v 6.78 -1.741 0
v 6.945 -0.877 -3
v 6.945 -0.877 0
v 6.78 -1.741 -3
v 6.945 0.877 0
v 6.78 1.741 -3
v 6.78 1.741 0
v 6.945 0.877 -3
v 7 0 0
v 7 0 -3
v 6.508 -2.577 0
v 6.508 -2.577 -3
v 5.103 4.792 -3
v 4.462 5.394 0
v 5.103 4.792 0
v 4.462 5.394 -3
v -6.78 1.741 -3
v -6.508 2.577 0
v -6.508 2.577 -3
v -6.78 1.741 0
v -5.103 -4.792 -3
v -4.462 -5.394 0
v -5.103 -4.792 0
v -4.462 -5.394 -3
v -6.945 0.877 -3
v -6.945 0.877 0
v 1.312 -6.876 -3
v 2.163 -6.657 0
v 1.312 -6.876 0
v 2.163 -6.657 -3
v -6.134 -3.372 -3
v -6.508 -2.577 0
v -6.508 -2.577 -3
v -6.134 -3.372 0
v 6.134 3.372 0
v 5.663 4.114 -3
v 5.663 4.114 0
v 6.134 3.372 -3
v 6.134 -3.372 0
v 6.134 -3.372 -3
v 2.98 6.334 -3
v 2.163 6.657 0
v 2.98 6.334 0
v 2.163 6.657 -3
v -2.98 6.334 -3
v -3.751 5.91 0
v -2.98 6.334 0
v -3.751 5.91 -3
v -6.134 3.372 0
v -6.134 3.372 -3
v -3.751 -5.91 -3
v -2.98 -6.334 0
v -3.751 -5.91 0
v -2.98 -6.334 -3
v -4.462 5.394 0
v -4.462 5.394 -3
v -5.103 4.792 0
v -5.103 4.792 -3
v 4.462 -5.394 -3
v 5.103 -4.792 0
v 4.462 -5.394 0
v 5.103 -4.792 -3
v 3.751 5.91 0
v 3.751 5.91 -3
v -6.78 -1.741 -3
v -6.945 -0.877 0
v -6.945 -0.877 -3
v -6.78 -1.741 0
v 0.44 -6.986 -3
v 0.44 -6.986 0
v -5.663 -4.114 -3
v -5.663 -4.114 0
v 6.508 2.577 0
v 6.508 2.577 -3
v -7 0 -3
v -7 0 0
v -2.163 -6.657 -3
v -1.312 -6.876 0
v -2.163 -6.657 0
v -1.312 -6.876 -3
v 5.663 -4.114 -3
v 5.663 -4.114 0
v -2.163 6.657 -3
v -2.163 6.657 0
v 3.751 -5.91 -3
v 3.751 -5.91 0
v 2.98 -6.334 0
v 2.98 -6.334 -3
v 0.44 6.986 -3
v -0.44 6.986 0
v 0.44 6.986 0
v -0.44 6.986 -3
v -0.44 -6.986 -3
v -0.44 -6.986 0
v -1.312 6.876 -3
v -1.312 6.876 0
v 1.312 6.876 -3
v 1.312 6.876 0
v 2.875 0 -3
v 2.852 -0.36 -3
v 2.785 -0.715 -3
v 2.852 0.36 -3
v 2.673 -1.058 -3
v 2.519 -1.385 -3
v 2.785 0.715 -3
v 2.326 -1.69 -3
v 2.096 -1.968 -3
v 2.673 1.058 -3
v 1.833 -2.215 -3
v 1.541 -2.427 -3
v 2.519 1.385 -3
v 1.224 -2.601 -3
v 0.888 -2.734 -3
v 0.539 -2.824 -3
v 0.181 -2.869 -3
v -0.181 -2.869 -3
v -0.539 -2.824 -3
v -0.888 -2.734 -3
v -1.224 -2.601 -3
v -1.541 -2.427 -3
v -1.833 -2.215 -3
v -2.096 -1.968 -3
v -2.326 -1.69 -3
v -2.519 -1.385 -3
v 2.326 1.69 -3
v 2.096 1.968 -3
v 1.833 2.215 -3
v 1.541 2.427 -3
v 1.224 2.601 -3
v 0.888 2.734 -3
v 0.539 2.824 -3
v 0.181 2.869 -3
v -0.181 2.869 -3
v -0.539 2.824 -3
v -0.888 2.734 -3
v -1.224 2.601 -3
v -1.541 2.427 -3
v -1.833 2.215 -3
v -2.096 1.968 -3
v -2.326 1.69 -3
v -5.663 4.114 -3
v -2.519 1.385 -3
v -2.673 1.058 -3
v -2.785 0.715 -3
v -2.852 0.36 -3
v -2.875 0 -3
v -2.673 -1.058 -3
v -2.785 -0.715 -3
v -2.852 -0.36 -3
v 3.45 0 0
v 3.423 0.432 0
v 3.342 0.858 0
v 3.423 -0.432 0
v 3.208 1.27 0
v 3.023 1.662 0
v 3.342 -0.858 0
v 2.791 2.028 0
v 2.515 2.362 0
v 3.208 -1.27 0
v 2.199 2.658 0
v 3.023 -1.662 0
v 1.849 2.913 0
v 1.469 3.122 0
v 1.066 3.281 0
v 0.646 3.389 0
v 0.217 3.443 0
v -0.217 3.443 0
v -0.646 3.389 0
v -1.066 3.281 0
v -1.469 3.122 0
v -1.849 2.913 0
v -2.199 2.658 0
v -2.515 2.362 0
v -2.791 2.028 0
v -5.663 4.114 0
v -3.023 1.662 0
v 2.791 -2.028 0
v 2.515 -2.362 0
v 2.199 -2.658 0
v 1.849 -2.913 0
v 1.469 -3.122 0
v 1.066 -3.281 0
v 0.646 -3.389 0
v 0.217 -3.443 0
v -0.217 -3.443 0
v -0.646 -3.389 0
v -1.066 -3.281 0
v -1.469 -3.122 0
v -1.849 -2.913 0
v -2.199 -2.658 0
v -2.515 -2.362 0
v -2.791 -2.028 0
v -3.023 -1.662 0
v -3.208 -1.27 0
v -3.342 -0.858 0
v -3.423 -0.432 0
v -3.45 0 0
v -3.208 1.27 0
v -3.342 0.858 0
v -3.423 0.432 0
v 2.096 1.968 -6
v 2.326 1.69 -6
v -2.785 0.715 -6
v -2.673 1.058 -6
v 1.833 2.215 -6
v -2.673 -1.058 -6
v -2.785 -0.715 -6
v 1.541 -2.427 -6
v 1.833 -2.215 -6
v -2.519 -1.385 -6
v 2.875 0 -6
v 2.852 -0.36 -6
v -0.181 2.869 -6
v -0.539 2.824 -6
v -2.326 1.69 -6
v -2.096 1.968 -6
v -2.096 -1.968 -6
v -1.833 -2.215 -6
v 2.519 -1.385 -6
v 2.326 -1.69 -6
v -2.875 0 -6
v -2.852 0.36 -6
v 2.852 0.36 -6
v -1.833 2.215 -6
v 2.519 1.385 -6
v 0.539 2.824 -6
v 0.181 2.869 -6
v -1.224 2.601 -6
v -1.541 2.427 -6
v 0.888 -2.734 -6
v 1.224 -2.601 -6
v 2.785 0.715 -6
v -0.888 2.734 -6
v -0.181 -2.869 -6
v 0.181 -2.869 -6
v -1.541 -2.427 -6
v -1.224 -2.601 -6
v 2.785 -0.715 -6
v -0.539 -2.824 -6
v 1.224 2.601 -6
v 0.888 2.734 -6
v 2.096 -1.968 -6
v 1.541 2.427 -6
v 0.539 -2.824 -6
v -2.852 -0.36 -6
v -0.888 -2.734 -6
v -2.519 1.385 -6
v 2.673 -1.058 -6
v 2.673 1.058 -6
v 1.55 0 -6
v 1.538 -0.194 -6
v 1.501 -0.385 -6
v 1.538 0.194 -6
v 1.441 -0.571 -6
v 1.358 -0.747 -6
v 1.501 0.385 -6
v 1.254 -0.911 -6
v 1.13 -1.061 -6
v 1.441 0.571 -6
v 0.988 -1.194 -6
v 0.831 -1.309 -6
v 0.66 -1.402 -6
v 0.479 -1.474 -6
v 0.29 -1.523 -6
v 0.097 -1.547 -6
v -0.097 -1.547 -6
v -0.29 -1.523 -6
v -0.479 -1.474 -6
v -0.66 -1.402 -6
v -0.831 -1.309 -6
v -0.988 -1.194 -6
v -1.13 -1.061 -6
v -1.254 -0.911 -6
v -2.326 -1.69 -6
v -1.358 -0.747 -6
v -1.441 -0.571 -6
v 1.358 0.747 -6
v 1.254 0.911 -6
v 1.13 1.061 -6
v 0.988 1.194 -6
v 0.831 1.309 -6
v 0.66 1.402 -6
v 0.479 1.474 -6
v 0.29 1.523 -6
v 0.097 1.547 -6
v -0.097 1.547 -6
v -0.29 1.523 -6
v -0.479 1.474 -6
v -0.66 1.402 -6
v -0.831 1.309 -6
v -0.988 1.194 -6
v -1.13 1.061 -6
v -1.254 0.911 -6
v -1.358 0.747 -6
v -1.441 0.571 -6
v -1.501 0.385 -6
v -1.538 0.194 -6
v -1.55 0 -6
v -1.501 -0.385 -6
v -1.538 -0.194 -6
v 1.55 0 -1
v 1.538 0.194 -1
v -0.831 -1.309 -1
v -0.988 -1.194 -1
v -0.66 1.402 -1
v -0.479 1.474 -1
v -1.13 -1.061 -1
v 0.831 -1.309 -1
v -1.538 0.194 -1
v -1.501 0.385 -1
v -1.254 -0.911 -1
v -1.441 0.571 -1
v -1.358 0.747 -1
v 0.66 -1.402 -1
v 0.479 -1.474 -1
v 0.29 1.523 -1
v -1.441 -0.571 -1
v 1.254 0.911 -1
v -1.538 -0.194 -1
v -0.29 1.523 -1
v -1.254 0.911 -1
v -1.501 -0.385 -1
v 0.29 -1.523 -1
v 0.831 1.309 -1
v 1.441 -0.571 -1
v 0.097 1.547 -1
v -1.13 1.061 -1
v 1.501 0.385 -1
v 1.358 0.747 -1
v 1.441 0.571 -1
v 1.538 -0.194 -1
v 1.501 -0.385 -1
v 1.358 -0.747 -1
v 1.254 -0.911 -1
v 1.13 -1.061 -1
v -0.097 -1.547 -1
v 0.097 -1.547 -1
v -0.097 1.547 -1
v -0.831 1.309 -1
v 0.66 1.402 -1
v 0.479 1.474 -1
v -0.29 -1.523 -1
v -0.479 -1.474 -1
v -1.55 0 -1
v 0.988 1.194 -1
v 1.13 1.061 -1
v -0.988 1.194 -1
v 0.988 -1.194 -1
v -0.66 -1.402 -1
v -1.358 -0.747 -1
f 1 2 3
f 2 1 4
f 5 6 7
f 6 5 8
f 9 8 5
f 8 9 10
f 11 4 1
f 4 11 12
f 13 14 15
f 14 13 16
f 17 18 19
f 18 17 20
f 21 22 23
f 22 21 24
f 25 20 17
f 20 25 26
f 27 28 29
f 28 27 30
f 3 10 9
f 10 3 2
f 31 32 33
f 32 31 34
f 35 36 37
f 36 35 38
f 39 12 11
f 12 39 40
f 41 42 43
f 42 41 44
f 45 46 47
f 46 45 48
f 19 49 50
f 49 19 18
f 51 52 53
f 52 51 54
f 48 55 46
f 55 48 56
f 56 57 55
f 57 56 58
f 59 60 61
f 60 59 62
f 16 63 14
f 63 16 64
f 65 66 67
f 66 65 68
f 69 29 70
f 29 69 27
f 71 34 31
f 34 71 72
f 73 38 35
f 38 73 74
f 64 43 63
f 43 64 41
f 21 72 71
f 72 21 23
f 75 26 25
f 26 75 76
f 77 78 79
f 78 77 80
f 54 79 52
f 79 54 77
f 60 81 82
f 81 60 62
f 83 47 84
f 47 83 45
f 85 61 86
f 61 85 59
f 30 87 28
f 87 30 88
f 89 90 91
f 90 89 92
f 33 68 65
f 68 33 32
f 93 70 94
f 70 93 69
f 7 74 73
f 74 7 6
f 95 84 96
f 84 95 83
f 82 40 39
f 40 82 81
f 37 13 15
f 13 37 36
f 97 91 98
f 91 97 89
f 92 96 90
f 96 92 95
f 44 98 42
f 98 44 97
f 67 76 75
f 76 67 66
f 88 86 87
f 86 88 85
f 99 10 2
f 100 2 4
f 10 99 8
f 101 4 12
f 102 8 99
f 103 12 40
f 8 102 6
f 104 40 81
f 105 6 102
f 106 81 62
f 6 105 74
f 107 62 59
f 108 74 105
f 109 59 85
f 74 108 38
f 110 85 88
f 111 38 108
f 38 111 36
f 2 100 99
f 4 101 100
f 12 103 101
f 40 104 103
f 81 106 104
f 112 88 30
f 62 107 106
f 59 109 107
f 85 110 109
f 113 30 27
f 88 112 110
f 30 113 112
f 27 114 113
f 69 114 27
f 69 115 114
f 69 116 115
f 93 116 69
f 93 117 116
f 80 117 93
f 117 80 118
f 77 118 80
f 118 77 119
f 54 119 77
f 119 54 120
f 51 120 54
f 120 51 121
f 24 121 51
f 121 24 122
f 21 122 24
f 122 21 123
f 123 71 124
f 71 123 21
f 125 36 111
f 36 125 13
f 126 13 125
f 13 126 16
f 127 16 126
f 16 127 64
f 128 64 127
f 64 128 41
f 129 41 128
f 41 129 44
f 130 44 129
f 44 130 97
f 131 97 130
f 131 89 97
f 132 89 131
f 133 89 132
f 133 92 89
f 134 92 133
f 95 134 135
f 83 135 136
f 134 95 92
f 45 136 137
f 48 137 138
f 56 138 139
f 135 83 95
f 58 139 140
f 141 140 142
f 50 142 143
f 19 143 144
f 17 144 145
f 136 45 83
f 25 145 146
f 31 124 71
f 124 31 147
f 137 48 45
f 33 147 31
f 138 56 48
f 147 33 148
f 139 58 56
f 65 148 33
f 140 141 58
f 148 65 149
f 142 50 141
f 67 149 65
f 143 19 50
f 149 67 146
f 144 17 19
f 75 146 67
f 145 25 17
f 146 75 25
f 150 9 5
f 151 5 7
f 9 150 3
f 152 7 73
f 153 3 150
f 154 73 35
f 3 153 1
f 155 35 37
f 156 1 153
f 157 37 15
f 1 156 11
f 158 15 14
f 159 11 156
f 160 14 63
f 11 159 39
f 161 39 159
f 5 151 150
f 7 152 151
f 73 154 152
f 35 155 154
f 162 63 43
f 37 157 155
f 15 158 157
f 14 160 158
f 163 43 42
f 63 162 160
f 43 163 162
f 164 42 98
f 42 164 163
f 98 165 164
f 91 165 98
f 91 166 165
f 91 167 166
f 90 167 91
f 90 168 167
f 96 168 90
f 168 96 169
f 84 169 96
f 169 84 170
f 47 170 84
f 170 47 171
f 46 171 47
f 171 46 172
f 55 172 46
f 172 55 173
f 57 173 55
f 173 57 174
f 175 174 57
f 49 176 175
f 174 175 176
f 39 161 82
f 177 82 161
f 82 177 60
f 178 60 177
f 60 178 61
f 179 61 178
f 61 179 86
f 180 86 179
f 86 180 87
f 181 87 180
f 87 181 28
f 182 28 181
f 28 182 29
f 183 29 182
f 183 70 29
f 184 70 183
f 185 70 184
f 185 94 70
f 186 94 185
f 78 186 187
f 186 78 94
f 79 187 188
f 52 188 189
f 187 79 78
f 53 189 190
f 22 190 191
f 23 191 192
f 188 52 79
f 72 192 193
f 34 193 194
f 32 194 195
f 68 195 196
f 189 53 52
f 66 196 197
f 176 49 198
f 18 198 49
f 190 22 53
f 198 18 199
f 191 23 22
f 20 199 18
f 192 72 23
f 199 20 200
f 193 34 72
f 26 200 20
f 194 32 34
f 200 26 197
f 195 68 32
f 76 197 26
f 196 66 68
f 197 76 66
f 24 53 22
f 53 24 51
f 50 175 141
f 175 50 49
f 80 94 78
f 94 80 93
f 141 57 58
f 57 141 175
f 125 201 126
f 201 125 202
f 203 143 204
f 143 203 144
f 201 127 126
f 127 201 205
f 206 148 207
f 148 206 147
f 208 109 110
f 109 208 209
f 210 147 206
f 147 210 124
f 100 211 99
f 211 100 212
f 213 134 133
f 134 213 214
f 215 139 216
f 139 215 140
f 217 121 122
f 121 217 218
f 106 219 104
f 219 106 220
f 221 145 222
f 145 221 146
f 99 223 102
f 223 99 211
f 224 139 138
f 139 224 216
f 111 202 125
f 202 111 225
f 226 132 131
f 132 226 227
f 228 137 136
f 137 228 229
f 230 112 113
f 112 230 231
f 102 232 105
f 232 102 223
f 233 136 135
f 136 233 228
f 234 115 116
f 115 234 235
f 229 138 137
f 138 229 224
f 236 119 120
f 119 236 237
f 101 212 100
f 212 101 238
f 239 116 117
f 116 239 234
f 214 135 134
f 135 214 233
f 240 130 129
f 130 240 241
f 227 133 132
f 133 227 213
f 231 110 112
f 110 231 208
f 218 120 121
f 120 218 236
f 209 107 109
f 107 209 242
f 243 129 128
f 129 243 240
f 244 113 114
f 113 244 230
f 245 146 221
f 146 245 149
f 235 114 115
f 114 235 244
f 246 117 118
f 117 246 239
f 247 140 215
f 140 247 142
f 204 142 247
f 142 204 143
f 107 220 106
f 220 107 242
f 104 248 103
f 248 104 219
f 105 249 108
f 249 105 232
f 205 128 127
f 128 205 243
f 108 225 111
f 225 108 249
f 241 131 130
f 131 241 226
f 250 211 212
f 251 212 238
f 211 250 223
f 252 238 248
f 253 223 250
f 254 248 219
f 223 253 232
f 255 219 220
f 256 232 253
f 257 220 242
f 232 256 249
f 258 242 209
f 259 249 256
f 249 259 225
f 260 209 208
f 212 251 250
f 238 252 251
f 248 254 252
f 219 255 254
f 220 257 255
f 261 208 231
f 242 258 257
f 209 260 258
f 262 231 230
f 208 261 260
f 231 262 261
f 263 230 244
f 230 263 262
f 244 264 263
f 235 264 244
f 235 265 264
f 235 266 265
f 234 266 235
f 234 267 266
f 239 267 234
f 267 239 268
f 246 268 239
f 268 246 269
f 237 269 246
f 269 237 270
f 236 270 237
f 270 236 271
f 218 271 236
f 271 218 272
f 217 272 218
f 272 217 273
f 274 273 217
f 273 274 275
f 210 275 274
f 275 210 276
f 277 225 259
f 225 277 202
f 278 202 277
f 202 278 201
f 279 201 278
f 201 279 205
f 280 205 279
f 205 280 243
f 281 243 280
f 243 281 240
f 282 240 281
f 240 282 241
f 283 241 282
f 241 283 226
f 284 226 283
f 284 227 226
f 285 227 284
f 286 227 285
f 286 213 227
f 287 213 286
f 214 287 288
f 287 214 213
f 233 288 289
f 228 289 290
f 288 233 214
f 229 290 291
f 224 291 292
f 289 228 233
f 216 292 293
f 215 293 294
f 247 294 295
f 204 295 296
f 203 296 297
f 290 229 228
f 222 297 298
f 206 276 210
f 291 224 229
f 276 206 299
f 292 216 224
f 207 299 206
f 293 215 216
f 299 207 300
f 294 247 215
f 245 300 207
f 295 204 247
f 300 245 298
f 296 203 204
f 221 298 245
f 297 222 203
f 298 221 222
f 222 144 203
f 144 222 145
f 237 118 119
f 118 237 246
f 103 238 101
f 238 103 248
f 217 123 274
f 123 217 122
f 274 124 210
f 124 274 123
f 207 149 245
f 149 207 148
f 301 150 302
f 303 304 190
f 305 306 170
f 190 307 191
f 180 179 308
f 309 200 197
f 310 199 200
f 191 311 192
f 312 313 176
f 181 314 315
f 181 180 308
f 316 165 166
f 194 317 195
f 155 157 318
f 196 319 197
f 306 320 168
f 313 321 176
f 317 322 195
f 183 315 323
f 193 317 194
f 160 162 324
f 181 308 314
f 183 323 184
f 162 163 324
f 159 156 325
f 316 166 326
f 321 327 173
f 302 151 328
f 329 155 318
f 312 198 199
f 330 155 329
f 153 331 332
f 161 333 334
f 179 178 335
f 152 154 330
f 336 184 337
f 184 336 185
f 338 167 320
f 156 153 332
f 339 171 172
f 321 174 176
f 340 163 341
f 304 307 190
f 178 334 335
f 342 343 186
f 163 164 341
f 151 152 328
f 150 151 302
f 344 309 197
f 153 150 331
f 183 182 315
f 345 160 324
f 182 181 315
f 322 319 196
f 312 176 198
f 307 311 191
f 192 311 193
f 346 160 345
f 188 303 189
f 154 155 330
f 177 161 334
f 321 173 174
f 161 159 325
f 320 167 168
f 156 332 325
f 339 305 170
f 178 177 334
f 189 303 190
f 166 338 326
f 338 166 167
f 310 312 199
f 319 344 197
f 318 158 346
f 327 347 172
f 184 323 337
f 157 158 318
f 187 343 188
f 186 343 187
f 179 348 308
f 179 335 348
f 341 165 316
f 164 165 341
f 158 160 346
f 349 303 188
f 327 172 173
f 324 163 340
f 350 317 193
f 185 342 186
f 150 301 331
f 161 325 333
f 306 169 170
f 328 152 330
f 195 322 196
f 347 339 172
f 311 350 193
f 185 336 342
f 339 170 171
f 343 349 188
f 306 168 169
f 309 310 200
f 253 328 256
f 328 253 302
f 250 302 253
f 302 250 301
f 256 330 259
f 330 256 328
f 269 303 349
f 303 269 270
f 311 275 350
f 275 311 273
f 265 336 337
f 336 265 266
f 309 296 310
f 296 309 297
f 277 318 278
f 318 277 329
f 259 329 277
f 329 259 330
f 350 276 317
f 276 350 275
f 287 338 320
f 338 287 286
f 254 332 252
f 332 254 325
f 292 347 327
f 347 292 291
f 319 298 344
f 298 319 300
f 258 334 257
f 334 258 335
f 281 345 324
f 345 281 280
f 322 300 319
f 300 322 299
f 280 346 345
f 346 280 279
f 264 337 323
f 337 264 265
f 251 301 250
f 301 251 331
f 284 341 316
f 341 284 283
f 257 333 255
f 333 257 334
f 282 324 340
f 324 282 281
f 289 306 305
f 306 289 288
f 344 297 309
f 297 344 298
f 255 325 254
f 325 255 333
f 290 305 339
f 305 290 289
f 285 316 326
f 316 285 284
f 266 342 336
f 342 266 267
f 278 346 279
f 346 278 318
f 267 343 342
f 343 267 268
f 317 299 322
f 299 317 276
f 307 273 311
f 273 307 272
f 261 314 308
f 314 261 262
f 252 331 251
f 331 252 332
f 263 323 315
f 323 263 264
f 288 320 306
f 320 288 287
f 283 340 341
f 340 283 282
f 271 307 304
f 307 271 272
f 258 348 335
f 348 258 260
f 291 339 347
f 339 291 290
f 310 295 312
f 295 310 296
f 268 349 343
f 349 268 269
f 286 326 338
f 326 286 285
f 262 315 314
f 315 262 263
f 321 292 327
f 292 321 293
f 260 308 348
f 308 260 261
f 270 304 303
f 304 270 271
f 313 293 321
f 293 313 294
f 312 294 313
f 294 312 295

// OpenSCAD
$fn = 50;


difference() {
	union() {
		translate(v = [0, 0, -3.0000000000]) {
			cylinder(h = 3, r = 7.0000000000);
		}
		#translate(v = [0, 0, -6.0000000000]) {
			cylinder(h = 6, r = 2.8750000000);
		}
	}
	union() {
		translate(v = [0, 0, 0]) {
			rotate(a = [0, 0, 0]) {
				difference() {
					union() {
						translate(v = [0, 0, -6.0000000000]) {
							cylinder(h = 6, r = 1.2500000000);
						}
						translate(v = [0, 0, -1.0000000000]) {
							cylinder(h = 1.0000000000, r1 = 1.5500000000, r2 = 3.4500000000);
						}
						translate(v = [0, 0, -6.0000000000]) {
							cylinder(h = 6, r = 1.5500000000);
						}
						translate(v = [0, 0, -6.0000000000]) {
							cylinder(h = 6, r = 1.2500000000);
						}
					}
					union();
				}
			}
		}
	}
}
